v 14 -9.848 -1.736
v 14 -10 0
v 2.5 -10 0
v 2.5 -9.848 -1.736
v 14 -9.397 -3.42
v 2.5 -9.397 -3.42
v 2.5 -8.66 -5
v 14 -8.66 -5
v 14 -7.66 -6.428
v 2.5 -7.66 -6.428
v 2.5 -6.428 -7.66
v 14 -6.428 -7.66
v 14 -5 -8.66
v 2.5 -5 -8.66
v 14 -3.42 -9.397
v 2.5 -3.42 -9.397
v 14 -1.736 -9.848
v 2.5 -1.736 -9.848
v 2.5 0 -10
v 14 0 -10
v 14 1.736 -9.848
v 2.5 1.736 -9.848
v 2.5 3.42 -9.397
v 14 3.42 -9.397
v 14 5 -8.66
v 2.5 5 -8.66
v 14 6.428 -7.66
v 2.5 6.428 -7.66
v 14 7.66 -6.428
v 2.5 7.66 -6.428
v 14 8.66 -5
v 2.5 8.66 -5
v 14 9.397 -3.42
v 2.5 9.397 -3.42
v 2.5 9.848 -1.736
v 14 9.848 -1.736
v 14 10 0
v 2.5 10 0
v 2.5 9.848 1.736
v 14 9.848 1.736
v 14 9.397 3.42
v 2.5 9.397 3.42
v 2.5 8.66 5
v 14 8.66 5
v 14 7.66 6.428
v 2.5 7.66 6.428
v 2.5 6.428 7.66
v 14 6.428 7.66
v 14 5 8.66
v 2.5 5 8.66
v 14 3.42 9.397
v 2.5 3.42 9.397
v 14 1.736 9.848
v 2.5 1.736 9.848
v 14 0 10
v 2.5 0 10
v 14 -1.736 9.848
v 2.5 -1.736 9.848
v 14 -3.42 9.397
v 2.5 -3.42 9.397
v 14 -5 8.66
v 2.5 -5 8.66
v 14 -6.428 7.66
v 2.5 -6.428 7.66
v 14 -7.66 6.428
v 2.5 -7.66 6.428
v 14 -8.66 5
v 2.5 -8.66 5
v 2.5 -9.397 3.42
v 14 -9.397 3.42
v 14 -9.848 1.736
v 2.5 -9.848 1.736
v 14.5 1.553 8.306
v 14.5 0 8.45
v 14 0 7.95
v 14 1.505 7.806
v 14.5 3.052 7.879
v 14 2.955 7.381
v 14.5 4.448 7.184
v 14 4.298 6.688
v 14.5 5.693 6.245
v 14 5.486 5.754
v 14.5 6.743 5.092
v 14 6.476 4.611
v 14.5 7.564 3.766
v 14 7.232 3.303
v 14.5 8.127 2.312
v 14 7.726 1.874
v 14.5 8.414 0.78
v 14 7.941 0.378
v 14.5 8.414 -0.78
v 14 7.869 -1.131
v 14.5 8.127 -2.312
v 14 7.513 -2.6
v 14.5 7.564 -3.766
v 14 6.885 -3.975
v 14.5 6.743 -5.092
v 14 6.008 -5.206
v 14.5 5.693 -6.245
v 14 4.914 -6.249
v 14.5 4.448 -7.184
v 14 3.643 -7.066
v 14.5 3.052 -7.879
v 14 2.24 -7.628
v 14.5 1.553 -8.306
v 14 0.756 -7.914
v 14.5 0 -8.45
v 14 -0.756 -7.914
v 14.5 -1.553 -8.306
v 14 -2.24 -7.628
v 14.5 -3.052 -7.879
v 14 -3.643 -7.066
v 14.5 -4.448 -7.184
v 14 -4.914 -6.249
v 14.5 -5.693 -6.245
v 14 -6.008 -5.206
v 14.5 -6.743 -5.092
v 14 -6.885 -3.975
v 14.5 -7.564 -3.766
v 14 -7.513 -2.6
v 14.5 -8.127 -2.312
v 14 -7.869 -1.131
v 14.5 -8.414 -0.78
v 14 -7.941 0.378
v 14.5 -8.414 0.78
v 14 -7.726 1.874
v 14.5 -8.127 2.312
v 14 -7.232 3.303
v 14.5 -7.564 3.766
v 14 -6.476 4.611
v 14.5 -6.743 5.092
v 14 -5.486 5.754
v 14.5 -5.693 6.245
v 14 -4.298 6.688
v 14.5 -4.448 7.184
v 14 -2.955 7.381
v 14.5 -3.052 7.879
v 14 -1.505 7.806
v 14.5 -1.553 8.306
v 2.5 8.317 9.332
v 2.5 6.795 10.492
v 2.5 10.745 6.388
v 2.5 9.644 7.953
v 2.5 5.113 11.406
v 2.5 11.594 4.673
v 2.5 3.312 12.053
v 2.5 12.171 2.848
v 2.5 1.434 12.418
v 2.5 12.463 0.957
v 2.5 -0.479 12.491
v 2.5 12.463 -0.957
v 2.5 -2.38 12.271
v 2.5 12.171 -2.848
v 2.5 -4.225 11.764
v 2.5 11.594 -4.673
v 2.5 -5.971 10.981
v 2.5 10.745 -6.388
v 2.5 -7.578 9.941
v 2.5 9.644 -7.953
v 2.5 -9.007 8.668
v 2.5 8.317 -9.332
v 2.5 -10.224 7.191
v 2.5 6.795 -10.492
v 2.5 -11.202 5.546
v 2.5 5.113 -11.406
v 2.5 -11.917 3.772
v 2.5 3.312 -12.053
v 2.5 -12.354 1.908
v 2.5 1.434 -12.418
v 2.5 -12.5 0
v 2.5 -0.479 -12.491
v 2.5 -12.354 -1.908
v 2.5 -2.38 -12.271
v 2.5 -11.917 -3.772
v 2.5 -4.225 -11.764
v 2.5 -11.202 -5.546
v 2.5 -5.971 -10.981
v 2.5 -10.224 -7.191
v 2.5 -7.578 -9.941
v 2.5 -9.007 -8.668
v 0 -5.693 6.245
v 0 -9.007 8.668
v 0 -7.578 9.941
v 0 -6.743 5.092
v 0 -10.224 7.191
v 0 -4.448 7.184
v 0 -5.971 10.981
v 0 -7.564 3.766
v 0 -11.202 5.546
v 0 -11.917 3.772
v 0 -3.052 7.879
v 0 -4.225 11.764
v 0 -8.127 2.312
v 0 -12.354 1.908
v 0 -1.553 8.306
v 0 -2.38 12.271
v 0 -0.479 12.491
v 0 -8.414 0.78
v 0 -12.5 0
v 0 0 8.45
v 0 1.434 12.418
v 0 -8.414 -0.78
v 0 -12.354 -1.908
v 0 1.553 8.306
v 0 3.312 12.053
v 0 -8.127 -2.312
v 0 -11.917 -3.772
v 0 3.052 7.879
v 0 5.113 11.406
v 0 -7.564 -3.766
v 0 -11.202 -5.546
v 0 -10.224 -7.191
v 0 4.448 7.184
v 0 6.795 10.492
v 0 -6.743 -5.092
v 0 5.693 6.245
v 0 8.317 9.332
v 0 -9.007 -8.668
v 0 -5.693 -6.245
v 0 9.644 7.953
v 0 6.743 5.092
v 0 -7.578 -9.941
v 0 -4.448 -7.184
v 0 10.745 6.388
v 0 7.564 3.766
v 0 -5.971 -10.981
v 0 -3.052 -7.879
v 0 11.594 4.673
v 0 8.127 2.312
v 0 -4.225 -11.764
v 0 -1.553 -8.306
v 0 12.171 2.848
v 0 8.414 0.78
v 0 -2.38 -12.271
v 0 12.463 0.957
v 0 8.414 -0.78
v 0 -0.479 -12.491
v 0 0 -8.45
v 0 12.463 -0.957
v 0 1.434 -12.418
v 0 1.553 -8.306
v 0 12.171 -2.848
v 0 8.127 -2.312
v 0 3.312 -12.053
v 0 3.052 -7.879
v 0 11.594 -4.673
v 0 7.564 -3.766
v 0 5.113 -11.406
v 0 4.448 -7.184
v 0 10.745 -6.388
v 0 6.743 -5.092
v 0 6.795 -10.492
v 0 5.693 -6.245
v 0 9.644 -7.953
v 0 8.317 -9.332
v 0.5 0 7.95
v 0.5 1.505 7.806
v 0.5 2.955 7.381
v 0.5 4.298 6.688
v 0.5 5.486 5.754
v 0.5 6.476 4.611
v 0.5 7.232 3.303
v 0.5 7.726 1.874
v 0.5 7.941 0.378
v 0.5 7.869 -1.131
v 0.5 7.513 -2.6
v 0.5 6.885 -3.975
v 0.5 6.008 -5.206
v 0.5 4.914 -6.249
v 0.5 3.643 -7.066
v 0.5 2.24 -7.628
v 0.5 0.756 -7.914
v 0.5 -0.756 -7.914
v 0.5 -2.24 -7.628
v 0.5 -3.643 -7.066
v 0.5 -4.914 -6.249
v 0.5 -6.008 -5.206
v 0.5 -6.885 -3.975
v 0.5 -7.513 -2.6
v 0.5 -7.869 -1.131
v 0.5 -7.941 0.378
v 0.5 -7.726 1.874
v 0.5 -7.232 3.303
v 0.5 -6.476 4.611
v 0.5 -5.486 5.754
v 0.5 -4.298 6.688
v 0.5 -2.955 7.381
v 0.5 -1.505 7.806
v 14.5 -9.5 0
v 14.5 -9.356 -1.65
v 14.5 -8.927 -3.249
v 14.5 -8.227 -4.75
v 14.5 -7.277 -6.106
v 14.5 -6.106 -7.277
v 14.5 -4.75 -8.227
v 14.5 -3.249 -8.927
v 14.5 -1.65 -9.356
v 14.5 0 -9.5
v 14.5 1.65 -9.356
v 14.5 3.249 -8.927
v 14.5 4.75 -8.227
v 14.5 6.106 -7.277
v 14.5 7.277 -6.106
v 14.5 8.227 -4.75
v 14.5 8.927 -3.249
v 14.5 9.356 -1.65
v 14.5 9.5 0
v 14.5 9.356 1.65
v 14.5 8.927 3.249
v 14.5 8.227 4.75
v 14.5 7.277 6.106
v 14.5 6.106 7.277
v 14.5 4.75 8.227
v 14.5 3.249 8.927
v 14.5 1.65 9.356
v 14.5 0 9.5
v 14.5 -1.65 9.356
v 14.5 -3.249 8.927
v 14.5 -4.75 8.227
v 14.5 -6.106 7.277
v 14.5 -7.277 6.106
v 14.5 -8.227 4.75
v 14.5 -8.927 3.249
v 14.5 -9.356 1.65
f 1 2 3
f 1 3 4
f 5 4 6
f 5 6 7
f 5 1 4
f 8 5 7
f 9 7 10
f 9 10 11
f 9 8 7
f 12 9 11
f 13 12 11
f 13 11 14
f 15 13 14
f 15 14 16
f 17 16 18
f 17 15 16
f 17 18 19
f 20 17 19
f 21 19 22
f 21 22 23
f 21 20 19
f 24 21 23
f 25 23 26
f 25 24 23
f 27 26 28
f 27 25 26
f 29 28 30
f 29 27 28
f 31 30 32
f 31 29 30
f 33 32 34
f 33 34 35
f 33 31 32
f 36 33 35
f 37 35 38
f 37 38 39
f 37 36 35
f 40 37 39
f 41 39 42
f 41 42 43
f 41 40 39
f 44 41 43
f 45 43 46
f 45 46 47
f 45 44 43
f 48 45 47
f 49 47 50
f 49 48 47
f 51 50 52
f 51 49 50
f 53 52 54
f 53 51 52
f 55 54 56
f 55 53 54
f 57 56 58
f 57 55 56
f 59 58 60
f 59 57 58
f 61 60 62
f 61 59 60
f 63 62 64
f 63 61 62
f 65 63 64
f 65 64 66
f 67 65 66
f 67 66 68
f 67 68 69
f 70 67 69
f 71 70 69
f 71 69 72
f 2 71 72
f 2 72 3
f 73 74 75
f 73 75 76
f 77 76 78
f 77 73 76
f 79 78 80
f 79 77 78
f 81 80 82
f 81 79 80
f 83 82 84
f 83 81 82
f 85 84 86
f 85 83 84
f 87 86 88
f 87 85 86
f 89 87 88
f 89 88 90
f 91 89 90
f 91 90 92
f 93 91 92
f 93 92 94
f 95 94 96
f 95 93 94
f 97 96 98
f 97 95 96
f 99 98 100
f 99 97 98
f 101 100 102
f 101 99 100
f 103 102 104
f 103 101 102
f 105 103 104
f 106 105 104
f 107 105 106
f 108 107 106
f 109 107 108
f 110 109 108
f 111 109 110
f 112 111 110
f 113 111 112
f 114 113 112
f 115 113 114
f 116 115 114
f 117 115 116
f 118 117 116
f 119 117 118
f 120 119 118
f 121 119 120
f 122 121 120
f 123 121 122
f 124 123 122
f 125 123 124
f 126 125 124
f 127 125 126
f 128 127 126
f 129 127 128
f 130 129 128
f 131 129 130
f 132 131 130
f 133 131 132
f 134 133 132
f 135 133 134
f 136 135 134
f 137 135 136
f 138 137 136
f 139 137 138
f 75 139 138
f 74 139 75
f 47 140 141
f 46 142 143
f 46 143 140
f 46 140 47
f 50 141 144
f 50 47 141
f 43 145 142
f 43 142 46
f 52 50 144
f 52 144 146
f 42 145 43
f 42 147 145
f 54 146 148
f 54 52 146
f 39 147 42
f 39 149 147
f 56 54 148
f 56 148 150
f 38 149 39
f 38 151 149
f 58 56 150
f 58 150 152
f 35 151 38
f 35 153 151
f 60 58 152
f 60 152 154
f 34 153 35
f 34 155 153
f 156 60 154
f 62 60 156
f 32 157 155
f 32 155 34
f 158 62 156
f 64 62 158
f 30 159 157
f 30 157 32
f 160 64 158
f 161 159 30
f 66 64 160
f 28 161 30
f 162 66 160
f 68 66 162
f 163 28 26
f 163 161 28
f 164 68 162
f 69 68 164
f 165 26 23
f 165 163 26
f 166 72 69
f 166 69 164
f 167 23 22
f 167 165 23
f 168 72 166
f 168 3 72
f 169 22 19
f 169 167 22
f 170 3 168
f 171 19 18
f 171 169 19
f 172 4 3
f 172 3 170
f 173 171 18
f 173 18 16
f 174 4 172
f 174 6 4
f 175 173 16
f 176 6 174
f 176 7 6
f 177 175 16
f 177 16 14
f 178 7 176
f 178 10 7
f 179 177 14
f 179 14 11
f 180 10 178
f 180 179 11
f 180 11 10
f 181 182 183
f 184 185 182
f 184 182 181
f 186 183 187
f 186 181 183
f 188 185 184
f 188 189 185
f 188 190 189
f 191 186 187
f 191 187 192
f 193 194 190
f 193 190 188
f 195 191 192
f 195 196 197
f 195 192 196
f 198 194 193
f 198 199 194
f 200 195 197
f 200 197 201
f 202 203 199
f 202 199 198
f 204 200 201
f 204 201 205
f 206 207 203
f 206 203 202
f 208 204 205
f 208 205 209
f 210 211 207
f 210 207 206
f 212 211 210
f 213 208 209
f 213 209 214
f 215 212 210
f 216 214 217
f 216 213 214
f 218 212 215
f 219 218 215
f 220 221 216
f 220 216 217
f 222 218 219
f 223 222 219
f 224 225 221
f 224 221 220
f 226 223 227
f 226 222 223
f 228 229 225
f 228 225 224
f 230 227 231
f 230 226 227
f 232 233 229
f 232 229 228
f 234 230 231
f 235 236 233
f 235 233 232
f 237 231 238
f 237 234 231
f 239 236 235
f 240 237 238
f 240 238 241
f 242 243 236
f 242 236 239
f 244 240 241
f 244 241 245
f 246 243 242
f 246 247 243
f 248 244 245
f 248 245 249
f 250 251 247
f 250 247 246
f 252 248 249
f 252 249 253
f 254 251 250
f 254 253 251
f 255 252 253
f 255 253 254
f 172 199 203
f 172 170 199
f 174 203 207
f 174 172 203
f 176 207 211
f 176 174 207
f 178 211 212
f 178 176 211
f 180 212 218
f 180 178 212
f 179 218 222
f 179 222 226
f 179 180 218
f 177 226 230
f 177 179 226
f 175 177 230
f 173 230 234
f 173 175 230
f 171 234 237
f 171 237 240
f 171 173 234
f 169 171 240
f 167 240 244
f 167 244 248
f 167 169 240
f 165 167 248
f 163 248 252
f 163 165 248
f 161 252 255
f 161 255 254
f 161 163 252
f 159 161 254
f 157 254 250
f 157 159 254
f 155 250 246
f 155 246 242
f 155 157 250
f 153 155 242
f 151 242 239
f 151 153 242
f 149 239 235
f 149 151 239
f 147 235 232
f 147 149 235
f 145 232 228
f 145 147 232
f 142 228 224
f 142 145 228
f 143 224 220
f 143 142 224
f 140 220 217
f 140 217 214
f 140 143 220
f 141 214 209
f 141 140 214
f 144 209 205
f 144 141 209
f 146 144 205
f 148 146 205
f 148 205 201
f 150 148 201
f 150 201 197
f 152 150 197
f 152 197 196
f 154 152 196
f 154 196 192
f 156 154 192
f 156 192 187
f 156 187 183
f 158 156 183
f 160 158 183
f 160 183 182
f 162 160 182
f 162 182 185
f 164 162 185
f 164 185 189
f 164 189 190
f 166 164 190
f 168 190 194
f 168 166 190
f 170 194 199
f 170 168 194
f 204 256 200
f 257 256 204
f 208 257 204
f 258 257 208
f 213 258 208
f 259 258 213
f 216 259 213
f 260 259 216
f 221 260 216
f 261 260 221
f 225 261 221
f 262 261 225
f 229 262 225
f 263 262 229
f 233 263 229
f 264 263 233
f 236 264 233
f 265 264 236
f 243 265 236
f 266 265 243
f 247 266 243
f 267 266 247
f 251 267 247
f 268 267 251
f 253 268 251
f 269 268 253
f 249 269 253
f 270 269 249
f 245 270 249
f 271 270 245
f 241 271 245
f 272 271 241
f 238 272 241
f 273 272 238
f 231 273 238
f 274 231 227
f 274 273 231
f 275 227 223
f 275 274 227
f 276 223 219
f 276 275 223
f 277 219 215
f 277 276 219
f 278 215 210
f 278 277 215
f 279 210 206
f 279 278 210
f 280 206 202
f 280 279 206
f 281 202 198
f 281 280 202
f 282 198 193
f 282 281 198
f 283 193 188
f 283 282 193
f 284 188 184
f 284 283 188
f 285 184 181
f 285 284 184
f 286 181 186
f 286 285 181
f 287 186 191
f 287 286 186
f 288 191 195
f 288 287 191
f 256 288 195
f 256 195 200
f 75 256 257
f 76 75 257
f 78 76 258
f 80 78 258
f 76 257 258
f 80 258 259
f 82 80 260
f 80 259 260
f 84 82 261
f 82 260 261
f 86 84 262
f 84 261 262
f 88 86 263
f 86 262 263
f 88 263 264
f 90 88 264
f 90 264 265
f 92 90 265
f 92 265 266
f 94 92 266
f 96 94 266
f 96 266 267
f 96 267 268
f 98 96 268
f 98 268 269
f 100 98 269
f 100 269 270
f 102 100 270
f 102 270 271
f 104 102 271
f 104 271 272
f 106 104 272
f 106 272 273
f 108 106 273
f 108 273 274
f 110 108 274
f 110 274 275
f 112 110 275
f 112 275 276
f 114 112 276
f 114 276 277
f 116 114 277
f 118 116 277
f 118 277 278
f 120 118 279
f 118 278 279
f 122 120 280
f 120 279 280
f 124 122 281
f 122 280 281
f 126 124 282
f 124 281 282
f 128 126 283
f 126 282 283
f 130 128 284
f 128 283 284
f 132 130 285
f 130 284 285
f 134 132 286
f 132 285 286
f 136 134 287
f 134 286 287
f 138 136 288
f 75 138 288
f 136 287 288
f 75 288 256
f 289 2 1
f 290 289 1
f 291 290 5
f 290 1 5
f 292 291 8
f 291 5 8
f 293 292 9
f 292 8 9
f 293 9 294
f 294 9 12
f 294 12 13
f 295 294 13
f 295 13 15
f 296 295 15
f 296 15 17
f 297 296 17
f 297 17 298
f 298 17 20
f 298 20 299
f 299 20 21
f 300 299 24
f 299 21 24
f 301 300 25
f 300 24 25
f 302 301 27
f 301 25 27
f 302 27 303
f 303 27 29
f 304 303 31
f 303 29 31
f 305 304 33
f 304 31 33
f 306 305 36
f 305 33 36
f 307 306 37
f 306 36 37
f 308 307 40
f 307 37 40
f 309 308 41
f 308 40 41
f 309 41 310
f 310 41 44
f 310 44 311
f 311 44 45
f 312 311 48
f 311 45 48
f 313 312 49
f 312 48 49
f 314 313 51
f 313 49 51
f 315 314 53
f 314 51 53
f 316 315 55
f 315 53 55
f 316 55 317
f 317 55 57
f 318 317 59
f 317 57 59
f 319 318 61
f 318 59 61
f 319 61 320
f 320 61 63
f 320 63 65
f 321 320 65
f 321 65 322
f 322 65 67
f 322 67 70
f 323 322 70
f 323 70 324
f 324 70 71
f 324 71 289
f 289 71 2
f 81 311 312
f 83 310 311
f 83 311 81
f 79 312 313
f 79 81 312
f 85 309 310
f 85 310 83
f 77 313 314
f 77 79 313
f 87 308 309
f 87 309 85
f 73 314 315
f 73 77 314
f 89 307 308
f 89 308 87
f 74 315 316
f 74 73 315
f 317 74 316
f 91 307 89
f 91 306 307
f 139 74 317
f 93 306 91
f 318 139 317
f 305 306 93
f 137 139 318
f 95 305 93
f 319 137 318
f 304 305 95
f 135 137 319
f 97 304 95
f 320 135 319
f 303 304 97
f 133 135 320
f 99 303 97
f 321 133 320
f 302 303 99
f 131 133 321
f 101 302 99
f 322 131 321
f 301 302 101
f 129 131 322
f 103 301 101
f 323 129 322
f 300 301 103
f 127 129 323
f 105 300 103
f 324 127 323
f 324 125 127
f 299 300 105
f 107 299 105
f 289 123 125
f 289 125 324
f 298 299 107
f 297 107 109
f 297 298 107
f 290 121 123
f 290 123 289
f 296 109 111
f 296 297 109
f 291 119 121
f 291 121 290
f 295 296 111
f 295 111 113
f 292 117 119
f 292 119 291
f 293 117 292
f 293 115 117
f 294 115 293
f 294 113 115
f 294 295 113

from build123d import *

# Parameters (mm, degrees)
DIAM_TRE_DU_PER_AGE_0_15_0_15_1_D = 15.9
CHANFREIN1_SIZE                   = 0.5


with BuildPart() as part:
    # Esquisse1 → Révolution1 (revolve)
    with BuildSketch(Plane.XY, mode=Mode.PRIVATE) as r_volution1_sk:
        Polygon((0, 0), (0, 12.5), (2.5, 12.5), (2.5, 10), (14.5, 10), (14.5, 0), align=None)
    revolve(r_volution1_sk.sketch.rotate(Axis((-19.53975326, 0, 0), (1, 0, 0)), 180), axis=Axis((-19.53975326, 0, 0), (1, 0, 0)))

    # Diamètre du perçage Ø0.15 (0.15)1 (through all)
    with Locations(Plane(origin=(14.5, 0, 0), x_dir=(0, 0, -1), z_dir=(1, 0, 0))):
        with Locations((0, 0)):
            Hole(DIAM_TRE_DU_PER_AGE_0_15_0_15_1_D / 2)

    # Chanfrein1
    chanfrein1_edges = [part.edges().sort_by_distance(p)[0] for p in [
        (14.5, 0, -7.95),
        (0, 0, -7.95),
        (14.5, 10, 0),
    ]]
    chamfer(chanfrein1_edges, length=CHANFREIN1_SIZE)


solid = part.part
